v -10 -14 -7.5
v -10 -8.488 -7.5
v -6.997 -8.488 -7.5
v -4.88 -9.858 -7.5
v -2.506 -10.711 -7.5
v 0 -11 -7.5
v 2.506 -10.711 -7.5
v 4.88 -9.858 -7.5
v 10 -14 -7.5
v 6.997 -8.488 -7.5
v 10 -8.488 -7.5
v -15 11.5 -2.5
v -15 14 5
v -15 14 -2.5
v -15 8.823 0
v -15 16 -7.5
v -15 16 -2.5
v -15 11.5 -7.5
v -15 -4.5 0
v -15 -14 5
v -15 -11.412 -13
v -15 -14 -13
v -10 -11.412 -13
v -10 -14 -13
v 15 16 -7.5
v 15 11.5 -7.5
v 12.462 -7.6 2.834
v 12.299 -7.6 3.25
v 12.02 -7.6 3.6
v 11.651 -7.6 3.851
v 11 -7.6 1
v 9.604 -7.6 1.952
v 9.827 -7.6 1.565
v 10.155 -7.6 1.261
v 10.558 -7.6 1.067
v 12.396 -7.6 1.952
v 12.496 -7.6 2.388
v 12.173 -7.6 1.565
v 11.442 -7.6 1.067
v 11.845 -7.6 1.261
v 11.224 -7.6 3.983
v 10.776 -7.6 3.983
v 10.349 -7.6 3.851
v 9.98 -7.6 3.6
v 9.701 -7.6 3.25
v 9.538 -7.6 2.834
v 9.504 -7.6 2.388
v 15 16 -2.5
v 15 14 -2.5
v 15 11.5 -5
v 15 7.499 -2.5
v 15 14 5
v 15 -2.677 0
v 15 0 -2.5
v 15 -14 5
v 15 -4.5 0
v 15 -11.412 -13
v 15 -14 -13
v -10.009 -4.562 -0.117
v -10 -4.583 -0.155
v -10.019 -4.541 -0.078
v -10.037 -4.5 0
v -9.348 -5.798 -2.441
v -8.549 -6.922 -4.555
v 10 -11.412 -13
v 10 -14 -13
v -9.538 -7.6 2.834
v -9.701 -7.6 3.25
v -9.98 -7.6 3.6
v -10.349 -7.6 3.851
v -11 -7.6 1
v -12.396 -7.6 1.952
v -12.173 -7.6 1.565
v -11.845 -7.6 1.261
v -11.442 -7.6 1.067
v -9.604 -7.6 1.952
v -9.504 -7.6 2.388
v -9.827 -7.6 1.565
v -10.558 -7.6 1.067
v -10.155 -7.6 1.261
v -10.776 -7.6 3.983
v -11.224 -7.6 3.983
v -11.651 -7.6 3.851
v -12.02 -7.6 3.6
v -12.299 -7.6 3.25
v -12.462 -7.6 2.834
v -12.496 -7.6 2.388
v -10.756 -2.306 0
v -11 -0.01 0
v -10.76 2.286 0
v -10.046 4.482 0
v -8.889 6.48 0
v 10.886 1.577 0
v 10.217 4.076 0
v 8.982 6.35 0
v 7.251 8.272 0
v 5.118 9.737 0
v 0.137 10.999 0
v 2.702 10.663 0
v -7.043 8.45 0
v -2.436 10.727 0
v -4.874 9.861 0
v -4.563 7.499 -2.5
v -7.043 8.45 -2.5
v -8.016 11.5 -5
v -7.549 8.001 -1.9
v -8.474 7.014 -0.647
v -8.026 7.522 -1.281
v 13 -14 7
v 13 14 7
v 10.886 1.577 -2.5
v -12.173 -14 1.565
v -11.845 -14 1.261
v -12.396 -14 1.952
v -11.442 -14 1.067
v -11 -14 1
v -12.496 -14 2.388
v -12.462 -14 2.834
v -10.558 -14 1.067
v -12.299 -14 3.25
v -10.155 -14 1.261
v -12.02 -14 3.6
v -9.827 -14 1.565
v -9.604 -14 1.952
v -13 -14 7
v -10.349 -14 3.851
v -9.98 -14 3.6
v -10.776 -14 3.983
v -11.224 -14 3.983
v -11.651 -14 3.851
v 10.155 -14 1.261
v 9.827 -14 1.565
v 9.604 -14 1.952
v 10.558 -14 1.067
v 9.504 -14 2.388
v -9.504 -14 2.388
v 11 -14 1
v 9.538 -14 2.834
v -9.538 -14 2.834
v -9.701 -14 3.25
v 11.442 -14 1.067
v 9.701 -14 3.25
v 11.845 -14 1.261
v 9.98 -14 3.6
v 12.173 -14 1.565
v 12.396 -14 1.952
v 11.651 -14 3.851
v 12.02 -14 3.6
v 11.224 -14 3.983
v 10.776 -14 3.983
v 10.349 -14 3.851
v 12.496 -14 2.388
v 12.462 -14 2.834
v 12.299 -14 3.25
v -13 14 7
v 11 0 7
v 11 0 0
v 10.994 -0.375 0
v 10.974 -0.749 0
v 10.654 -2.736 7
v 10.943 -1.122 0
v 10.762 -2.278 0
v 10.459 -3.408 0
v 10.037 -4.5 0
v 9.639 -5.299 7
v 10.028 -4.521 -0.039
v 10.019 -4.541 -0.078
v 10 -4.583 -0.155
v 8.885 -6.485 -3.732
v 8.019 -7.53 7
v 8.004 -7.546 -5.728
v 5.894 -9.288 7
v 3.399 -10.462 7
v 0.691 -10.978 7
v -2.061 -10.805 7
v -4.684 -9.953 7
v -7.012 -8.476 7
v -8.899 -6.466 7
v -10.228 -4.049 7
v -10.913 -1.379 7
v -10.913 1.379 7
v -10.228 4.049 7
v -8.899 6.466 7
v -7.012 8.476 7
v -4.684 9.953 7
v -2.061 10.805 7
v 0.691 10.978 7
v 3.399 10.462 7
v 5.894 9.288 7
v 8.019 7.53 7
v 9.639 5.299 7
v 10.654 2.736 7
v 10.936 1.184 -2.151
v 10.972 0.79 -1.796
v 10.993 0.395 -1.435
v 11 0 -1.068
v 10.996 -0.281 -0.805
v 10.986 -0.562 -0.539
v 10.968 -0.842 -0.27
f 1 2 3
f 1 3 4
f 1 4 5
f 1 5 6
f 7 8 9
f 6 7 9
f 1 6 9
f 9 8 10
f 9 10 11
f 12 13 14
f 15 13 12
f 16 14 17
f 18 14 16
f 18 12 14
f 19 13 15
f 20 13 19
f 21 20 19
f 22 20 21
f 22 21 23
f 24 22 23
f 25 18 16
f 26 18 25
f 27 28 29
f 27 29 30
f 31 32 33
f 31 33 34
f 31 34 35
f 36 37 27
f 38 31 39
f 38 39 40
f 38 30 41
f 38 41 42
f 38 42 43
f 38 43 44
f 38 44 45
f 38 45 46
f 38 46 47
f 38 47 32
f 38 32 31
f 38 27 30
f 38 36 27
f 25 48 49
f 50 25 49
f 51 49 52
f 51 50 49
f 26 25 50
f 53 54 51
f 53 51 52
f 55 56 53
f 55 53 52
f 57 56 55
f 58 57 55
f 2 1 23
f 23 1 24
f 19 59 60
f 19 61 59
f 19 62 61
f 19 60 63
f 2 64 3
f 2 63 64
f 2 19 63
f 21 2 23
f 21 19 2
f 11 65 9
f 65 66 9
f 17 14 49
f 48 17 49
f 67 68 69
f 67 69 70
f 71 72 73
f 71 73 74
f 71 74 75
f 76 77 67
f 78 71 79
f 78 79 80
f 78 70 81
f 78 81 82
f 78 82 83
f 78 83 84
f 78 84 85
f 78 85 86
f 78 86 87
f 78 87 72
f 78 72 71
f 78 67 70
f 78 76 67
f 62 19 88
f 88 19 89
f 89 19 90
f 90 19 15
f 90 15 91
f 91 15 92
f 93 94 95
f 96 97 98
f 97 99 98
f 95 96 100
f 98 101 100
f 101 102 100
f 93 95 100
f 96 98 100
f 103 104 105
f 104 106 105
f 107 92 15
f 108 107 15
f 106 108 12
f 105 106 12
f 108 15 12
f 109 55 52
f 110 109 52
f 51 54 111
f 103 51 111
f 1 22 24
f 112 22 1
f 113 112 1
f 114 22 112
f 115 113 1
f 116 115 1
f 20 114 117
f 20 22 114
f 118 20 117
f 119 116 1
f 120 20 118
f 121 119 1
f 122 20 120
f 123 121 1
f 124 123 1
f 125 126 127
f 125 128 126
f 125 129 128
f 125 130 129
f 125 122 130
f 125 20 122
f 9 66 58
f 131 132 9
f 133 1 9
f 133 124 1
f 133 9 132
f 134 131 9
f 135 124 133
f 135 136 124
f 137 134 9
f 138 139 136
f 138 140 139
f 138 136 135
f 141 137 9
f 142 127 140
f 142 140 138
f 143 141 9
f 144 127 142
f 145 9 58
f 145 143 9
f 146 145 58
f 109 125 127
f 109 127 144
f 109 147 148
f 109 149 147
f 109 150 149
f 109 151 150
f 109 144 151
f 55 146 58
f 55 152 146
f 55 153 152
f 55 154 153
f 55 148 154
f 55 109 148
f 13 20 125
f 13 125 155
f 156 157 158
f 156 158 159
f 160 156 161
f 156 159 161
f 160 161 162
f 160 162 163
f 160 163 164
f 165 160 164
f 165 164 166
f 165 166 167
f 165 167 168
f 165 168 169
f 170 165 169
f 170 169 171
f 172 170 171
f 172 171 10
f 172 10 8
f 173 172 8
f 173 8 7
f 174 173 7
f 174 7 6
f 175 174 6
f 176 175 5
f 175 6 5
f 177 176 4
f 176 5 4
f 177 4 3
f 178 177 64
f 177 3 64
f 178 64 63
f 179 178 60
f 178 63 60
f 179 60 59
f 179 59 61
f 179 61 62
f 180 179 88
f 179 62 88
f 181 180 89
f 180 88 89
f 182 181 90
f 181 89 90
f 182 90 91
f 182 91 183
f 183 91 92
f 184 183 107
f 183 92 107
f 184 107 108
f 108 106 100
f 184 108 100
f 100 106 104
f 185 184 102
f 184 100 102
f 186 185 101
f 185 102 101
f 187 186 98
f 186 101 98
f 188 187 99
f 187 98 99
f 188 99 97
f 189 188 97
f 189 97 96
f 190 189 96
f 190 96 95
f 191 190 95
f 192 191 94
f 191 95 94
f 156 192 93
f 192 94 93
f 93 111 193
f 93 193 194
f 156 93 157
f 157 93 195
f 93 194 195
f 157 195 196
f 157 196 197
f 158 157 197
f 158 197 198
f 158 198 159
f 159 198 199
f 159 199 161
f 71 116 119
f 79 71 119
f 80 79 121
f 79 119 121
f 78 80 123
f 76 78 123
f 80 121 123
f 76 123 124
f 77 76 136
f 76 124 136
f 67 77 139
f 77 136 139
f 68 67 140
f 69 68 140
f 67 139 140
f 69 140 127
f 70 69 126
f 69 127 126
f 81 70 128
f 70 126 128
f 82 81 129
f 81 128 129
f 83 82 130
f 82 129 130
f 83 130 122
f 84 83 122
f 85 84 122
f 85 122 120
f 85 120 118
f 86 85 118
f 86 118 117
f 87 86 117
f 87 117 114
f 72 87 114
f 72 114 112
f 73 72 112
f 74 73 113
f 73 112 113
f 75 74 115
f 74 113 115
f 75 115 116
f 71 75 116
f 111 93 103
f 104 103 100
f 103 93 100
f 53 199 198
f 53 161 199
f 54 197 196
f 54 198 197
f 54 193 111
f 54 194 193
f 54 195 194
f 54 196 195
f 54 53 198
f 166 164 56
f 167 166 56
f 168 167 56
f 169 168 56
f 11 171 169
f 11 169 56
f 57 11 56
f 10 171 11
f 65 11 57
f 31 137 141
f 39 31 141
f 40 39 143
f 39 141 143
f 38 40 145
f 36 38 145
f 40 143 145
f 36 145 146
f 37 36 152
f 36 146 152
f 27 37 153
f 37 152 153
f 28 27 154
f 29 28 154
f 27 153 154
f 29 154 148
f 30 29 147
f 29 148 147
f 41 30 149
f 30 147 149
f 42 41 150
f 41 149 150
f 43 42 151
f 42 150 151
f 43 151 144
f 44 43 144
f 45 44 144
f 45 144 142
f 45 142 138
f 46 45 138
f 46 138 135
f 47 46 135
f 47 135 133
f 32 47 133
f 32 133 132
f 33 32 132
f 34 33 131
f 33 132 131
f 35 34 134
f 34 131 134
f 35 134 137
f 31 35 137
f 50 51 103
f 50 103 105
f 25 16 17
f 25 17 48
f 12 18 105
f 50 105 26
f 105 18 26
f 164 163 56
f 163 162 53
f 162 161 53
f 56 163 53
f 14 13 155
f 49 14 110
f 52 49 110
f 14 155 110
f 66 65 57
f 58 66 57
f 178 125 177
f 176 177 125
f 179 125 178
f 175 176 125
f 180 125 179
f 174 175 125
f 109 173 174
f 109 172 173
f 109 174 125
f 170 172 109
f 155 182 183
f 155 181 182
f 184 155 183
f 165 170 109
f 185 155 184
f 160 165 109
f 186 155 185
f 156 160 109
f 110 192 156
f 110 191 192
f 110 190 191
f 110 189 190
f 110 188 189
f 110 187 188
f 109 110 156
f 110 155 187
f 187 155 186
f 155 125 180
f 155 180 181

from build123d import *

# Parameters (mm, degrees)
SKETCH1_W           = 30
SKETCH1_H           = 28
SKETCH1_R           = 11
BOSS_EXTRUDE1_DEPTH = 7
SKETCH2_W           = 5
SKETCH2_H           = 2.5
BOSS_EXTRUDE2_DEPTH = 13
CHAMFER2_SIZE       = 2
BOSS_EXTRUDE6_DEPTH = 2.5
CHAMFER3_SIZE       = 2
CHAMFER4_SIZE       = 2
BOSS_EXTRUDE4_DEPTH = 2.5
CHAMFER6_SIZE       = 2.5
CHAMFER7_SIZE       = 7
CHAMFER7_SIZE_2     = 13.165085257
SKETCH7_R           = 1.5
CUT_EXTRUDE2_DEPTH  = 6.4
BOSS_EXTRUDE7_START = -2.5
SKETCH8_W           = 30
SKETCH8_H           = 5
BOSS_EXTRUDE7_DEPTH = 4.5
CHAMFER8_SIZE       = 4.000836323
CHAMFER8_SIZE_2     = 2.5


with BuildPart() as part:
    # Sketch1 → Boss-Extrude1 (new body)
    with BuildSketch(Plane.XY):
        Rectangle(SKETCH1_W, SKETCH1_H)
        Circle(SKETCH1_R, mode=Mode.SUBTRACT)
    extrude(amount=BOSS_EXTRUDE1_DEPTH)

    # Sketch2 → Boss-Extrude2 (add)
    with BuildSketch(Plane(origin=(0, 0, 0), x_dir=(-1, 0, 0), z_dir=(0, 0, -1))):
        with Locations((-12.5, -12.75)):
            Rectangle(SKETCH2_W, SKETCH2_H)
        with Locations((12.5, -12.75)):
            Rectangle(SKETCH2_W, SKETCH2_H)
    extrude(amount=BOSS_EXTRUDE2_DEPTH)

    # Chamfer2
    chamfer2_edges = [part.edges().sort_by_distance(p)[0] for p in [
        (-10, -12.75, 0),
        (10, -12.75, 0),
    ]]
    chamfer(chamfer2_edges, length=CHAMFER2_SIZE)

    # Sketch5 → Boss-Extrude6 (add)
    with BuildSketch(Plane.XZ.offset(14)):
        Polygon((-10, -2), (-10, -7.5), (10, -7.5), (10, -2), (8, 0), (-8, 0), align=None)
    extrude(amount=-BOSS_EXTRUDE6_DEPTH)

    # Chamfer3
    chamfer3_edges = [part.edges().sort_by_distance(p)[0] for p in [
        (15, 0, 7),
    ]]
    chamfer(chamfer3_edges, length=CHAMFER3_SIZE)

    # Chamfer4
    chamfer4_edges = [part.edges().sort_by_distance(p)[0] for p in [
        (-15, 0, 7),
    ]]
    chamfer(chamfer4_edges, length=CHAMFER4_SIZE)

    # Sketch4 → Boss-Extrude4 (add)
    with BuildSketch(Plane(origin=(0, 0, 0), x_dir=(-1, 0, 0), z_dir=(0, 0, -1))):
        Polygon((-15, 0), (15, 11.5), (15, 14), (-15, 14), align=None)
    extrude(amount=BOSS_EXTRUDE4_DEPTH)

    # Chamfer6
    # the kernel refuses this chamfer: 2.5 mm, written as the material it adds along each edge
    with BuildSketch(Plane(origin=(21.003247512, -2.30124488, 0), x_dir=(-0.3578006820796162, -0.9333930836859554, 0.02749587661058638), z_dir=(-0.9337461173020497, 0.35793601163245237, 0))) as chamfer6_piece_1_section:
        Polygon((CHAMFER6_SIZE * 0.999621916911, -CHAMFER6_SIZE * 0.0274958766106), (-CHAMFER6_SIZE * 0.0274958766106, -CHAMFER6_SIZE * 0.999621916911), (0, 0), align=None)
    chamfer6_piece_1 = extrude(amount=17.263908412, mode=Mode.PRIVATE)
    chamfer6_piece_1 = chamfer6_piece_1 - Plane(origin=(0, 0, -0.835393566), x_dir=(1, 0, 0), z_dir=(0, 0, -1)) * Cylinder(11, 45, mode=Mode.PRIVATE)
    chamfer6_piece_1 = split(chamfer6_piece_1, bisect_by=Plane(origin=(15, -0.113968884, -0.835393566), z_dir=(-1, 0, 0)), keep=Keep.TOP, mode=Mode.PRIVATE)
    add(chamfer6_piece_1)
    with BuildSketch(Plane(origin=(-1.03959441, 6.148511191, 0), x_dir=(-0.35780068207961624, -0.9333930836859554, 0.02749587661058638), z_dir=(-0.9337461173020497, 0.35793601163245237, 0))) as chamfer6_piece_2_section:
        Polygon((CHAMFER6_SIZE * 0.999621916911, -CHAMFER6_SIZE * 0.0274958766106), (-CHAMFER6_SIZE * 0.0274958766106, -CHAMFER6_SIZE * 0.999621916911), (0, 0), align=None)
    chamfer6_piece_2 = extrude(amount=21.380172546, mode=Mode.PRIVATE)
    chamfer6_piece_2 = chamfer6_piece_2 - Plane(origin=(0, 0, -0.851534645), x_dir=(1, 0, 0), z_dir=(0, 0, -1)) * Cylinder(11, 53, mode=Mode.PRIVATE)
    chamfer6_piece_2 = split(chamfer6_piece_2, bisect_by=Plane(origin=(-15, 9.244820467, -0.851534645), z_dir=(1, 0, 0)), keep=Keep.TOP, mode=Mode.PRIVATE)
    add(chamfer6_piece_2)

    # Chamfer7
    # the kernel refuses this chamfer: 13.165085257, 7 mm, written as the material it adds along each edge
    with BuildSketch(Plane(origin=(-15, -11.5, 0), x_dir=(0, 0.9979482451756082, 0.06402577567608186), z_dir=(1, 0, 0))) as chamfer7_piece_1_section:
        Polygon((CHAMFER7_SIZE * 0.997948245176, -CHAMFER7_SIZE * 0.0640257756761), (-CHAMFER7_SIZE_2 * 0.0640257756781, -CHAMFER7_SIZE_2 * 0.997948245208), (0, 0), align=None)
    chamfer7_piece_1 = extrude(amount=30, mode=Mode.PRIVATE)
    chamfer7_piece_1 = chamfer7_piece_1 - Plane(origin=(0, 0, -3.073682767), x_dir=(1, 0, 0), z_dir=(0, 0, -1)) * Cylinder(11, 113, mode=Mode.PRIVATE)
    chamfer7_piece_1 = split(chamfer7_piece_1, bisect_by=Plane(origin=(-10, -8.887755394, -3.073682767), z_dir=(-1, 0, 0)), keep=Keep.TOP, mode=Mode.PRIVATE)
    chamfer7_piece_1 = split(chamfer7_piece_1, bisect_by=Plane(origin=(-12.500128058, -8.887755394, -7.5), z_dir=(0, 0, 1)), keep=Keep.TOP, mode=Mode.PRIVATE)
    add(chamfer7_piece_1)
    with BuildSketch(Plane(origin=(-15, -11.5, 0), x_dir=(0, 0.9979482451756082, 0.06402577567608186), z_dir=(1, 0, 0))) as chamfer7_piece_2_section:
        Polygon((CHAMFER7_SIZE * 0.997948245176, -CHAMFER7_SIZE * 0.0640257756761), (-CHAMFER7_SIZE_2 * 0.0640257756781, -CHAMFER7_SIZE_2 * 0.997948245208), (0, 0), align=None)
    chamfer7_piece_2 = extrude(amount=30, mode=Mode.PRIVATE)
    chamfer7_piece_2 = split(chamfer7_piece_2, bisect_by=Plane(origin=(-10, -10.721530873, -9.597564575), z_dir=(-1, 0, 0)), keep=Keep.TOP, mode=Mode.PRIVATE)
    chamfer7_piece_2 = split(chamfer7_piece_2, bisect_by=Plane(origin=(-12.5, -10.721530873, -7.5), z_dir=(0, 0, -1)), keep=Keep.TOP, mode=Mode.PRIVATE)
    chamfer7_piece_2 = split(chamfer7_piece_2, bisect_by=Plane(origin=(-12.5, -10.721530873, -13), z_dir=(0, 0, 1)), keep=Keep.TOP, mode=Mode.PRIVATE)
    add(chamfer7_piece_2)
    with BuildSketch(Plane(origin=(-15, -11.5, 0), x_dir=(0, 0.9979482451756082, 0.06402577567608186), z_dir=(1, 0, 0))) as chamfer7_piece_3_section:
        Polygon((CHAMFER7_SIZE * 0.997948245176, -CHAMFER7_SIZE * 0.0640257756761), (-CHAMFER7_SIZE_2 * 0.0640257756781, -CHAMFER7_SIZE_2 * 0.997948245208), (0, 0), align=None)
    chamfer7_piece_3 = extrude(amount=30, mode=Mode.PRIVATE)
    chamfer7_piece_3 = chamfer7_piece_3 - Plane(origin=(0, 0, -3.793876077), x_dir=(1, 0, 0), z_dir=(0, 0, -1)) * Cylinder(11, 113, mode=Mode.PRIVATE)
    chamfer7_piece_3 = split(chamfer7_piece_3, bisect_by=Plane(origin=(-10, -6.598719884, -3.793876077), z_dir=(1, 0, 0)), keep=Keep.TOP, mode=Mode.PRIVATE)
    chamfer7_piece_3 = split(chamfer7_piece_3, bisect_by=Plane(origin=(-9.499486782, -6.598719884, -7.5), z_dir=(0, 0, 1)), keep=Keep.TOP, mode=Mode.PRIVATE)
    chamfer7_piece_3 = split(chamfer7_piece_3, bisect_by=Plane(origin=(10, -6.598719884, -3.793876077), z_dir=(-1, 0, 0)), keep=Keep.TOP, mode=Mode.PRIVATE)
    add(chamfer7_piece_3)
    with BuildSketch(Plane(origin=(-15, -11.5, 0), x_dir=(0, 0.9979482451756082, 0.06402577567608186), z_dir=(1, 0, 0))) as chamfer7_piece_4_section:
        Polygon((CHAMFER7_SIZE * 0.997948245176, -CHAMFER7_SIZE * 0.0640257756761), (-CHAMFER7_SIZE_2 * 0.0640257756781, -CHAMFER7_SIZE_2 * 0.997948245208), (0, 0), align=None)
    chamfer7_piece_4 = extrude(amount=30, mode=Mode.PRIVATE)
    chamfer7_piece_4 = split(chamfer7_piece_4, bisect_by=Plane(origin=(12.5, -10.721530873, -7.5), z_dir=(0, 0, -1)), keep=Keep.TOP, mode=Mode.PRIVATE)
    chamfer7_piece_4 = split(chamfer7_piece_4, bisect_by=Plane(origin=(10, -10.721530873, -9.597564575), z_dir=(1, 0, 0)), keep=Keep.TOP, mode=Mode.PRIVATE)
    chamfer7_piece_4 = split(chamfer7_piece_4, bisect_by=Plane(origin=(12.5, -10.721530873, -13), z_dir=(0, 0, 1)), keep=Keep.TOP, mode=Mode.PRIVATE)
    add(chamfer7_piece_4)
    with BuildSketch(Plane(origin=(-15, -11.5, 0), x_dir=(0, 0.9979482451756082, 0.06402577567608186), z_dir=(1, 0, 0))) as chamfer7_piece_5_section:
        Polygon((CHAMFER7_SIZE * 0.997948245176, -CHAMFER7_SIZE * 0.0640257756761), (-CHAMFER7_SIZE_2 * 0.0640257756781, -CHAMFER7_SIZE_2 * 0.997948245208), (0, 0), align=None)
    chamfer7_piece_5 = extrude(amount=30, mode=Mode.PRIVATE)
    chamfer7_piece_5 = chamfer7_piece_5 - Plane(origin=(0, 0, -3.073682766), x_dir=(1, 0, 0), z_dir=(0, 0, -1)) * Cylinder(11, 113, mode=Mode.PRIVATE)
    chamfer7_piece_5 = split(chamfer7_piece_5, bisect_by=Plane(origin=(12.500128057, -8.887755394, -7.5), z_dir=(0, 0, 1)), keep=Keep.TOP, mode=Mode.PRIVATE)
    chamfer7_piece_5 = split(chamfer7_piece_5, bisect_by=Plane(origin=(10, -8.887755394, -3.073682766), z_dir=(1, 0, 0)), keep=Keep.TOP, mode=Mode.PRIVATE)
    add(chamfer7_piece_5)

    # Sketch7 → Cut-Extrude2 (cut)
    with BuildSketch(Plane.XZ.offset(14)):
        with Locations(Location((-11, 2.5, 0), (0, 0, 270))):
            Circle(SKETCH7_R)
        with Locations(Location((11, 2.5, 0), (0, 0, 270))):
            Circle(SKETCH7_R)
    extrude(amount=-CUT_EXTRUDE2_DEPTH, mode=Mode.SUBTRACT)

    # Sketch8 → Boss-Extrude7 (add)
    with BuildSketch(Plane(origin=(0, 14, 0), x_dir=(1, 0, 0), z_dir=(0, 1, 0)).offset(BOSS_EXTRUDE7_START)):
        with Locations((0, 5)):
            Rectangle(SKETCH8_W, SKETCH8_H)
    extrude(amount=BOSS_EXTRUDE7_DEPTH)

    # Chamfer8
    # the kernel refuses this chamfer: 4.000836323, 2.5 mm, written as the material it adds along each edge
    with BuildSketch(Plane(origin=(-25.343554005, 11.5, -2.5), x_dir=(0, -0.9997899140358645, 0.02049701910421793), z_dir=(1, 0, 0))) as chamfer8_piece_1_section:
        Polygon((CHAMFER8_SIZE * 0.999789913937, CHAMFER8_SIZE * 0.0204970191022), (-CHAMFER8_SIZE_2 * 0.0204970191042, CHAMFER8_SIZE_2 * 0.999789914036), (0, 0), align=None)
    chamfer8_piece_1 = extrude(amount=40.343554005, mode=Mode.PRIVATE)
    chamfer8_piece_1 = split(chamfer8_piece_1, bisect_by=Plane(origin=(2.975759377, 8.202968449, -5.855581208), z_dir=(0.25309898105600476, 0.6602582114512465, 0.707106781186274)), keep=Keep.TOP, mode=Mode.PRIVATE)
    add(chamfer8_piece_1)


solid = part.part
